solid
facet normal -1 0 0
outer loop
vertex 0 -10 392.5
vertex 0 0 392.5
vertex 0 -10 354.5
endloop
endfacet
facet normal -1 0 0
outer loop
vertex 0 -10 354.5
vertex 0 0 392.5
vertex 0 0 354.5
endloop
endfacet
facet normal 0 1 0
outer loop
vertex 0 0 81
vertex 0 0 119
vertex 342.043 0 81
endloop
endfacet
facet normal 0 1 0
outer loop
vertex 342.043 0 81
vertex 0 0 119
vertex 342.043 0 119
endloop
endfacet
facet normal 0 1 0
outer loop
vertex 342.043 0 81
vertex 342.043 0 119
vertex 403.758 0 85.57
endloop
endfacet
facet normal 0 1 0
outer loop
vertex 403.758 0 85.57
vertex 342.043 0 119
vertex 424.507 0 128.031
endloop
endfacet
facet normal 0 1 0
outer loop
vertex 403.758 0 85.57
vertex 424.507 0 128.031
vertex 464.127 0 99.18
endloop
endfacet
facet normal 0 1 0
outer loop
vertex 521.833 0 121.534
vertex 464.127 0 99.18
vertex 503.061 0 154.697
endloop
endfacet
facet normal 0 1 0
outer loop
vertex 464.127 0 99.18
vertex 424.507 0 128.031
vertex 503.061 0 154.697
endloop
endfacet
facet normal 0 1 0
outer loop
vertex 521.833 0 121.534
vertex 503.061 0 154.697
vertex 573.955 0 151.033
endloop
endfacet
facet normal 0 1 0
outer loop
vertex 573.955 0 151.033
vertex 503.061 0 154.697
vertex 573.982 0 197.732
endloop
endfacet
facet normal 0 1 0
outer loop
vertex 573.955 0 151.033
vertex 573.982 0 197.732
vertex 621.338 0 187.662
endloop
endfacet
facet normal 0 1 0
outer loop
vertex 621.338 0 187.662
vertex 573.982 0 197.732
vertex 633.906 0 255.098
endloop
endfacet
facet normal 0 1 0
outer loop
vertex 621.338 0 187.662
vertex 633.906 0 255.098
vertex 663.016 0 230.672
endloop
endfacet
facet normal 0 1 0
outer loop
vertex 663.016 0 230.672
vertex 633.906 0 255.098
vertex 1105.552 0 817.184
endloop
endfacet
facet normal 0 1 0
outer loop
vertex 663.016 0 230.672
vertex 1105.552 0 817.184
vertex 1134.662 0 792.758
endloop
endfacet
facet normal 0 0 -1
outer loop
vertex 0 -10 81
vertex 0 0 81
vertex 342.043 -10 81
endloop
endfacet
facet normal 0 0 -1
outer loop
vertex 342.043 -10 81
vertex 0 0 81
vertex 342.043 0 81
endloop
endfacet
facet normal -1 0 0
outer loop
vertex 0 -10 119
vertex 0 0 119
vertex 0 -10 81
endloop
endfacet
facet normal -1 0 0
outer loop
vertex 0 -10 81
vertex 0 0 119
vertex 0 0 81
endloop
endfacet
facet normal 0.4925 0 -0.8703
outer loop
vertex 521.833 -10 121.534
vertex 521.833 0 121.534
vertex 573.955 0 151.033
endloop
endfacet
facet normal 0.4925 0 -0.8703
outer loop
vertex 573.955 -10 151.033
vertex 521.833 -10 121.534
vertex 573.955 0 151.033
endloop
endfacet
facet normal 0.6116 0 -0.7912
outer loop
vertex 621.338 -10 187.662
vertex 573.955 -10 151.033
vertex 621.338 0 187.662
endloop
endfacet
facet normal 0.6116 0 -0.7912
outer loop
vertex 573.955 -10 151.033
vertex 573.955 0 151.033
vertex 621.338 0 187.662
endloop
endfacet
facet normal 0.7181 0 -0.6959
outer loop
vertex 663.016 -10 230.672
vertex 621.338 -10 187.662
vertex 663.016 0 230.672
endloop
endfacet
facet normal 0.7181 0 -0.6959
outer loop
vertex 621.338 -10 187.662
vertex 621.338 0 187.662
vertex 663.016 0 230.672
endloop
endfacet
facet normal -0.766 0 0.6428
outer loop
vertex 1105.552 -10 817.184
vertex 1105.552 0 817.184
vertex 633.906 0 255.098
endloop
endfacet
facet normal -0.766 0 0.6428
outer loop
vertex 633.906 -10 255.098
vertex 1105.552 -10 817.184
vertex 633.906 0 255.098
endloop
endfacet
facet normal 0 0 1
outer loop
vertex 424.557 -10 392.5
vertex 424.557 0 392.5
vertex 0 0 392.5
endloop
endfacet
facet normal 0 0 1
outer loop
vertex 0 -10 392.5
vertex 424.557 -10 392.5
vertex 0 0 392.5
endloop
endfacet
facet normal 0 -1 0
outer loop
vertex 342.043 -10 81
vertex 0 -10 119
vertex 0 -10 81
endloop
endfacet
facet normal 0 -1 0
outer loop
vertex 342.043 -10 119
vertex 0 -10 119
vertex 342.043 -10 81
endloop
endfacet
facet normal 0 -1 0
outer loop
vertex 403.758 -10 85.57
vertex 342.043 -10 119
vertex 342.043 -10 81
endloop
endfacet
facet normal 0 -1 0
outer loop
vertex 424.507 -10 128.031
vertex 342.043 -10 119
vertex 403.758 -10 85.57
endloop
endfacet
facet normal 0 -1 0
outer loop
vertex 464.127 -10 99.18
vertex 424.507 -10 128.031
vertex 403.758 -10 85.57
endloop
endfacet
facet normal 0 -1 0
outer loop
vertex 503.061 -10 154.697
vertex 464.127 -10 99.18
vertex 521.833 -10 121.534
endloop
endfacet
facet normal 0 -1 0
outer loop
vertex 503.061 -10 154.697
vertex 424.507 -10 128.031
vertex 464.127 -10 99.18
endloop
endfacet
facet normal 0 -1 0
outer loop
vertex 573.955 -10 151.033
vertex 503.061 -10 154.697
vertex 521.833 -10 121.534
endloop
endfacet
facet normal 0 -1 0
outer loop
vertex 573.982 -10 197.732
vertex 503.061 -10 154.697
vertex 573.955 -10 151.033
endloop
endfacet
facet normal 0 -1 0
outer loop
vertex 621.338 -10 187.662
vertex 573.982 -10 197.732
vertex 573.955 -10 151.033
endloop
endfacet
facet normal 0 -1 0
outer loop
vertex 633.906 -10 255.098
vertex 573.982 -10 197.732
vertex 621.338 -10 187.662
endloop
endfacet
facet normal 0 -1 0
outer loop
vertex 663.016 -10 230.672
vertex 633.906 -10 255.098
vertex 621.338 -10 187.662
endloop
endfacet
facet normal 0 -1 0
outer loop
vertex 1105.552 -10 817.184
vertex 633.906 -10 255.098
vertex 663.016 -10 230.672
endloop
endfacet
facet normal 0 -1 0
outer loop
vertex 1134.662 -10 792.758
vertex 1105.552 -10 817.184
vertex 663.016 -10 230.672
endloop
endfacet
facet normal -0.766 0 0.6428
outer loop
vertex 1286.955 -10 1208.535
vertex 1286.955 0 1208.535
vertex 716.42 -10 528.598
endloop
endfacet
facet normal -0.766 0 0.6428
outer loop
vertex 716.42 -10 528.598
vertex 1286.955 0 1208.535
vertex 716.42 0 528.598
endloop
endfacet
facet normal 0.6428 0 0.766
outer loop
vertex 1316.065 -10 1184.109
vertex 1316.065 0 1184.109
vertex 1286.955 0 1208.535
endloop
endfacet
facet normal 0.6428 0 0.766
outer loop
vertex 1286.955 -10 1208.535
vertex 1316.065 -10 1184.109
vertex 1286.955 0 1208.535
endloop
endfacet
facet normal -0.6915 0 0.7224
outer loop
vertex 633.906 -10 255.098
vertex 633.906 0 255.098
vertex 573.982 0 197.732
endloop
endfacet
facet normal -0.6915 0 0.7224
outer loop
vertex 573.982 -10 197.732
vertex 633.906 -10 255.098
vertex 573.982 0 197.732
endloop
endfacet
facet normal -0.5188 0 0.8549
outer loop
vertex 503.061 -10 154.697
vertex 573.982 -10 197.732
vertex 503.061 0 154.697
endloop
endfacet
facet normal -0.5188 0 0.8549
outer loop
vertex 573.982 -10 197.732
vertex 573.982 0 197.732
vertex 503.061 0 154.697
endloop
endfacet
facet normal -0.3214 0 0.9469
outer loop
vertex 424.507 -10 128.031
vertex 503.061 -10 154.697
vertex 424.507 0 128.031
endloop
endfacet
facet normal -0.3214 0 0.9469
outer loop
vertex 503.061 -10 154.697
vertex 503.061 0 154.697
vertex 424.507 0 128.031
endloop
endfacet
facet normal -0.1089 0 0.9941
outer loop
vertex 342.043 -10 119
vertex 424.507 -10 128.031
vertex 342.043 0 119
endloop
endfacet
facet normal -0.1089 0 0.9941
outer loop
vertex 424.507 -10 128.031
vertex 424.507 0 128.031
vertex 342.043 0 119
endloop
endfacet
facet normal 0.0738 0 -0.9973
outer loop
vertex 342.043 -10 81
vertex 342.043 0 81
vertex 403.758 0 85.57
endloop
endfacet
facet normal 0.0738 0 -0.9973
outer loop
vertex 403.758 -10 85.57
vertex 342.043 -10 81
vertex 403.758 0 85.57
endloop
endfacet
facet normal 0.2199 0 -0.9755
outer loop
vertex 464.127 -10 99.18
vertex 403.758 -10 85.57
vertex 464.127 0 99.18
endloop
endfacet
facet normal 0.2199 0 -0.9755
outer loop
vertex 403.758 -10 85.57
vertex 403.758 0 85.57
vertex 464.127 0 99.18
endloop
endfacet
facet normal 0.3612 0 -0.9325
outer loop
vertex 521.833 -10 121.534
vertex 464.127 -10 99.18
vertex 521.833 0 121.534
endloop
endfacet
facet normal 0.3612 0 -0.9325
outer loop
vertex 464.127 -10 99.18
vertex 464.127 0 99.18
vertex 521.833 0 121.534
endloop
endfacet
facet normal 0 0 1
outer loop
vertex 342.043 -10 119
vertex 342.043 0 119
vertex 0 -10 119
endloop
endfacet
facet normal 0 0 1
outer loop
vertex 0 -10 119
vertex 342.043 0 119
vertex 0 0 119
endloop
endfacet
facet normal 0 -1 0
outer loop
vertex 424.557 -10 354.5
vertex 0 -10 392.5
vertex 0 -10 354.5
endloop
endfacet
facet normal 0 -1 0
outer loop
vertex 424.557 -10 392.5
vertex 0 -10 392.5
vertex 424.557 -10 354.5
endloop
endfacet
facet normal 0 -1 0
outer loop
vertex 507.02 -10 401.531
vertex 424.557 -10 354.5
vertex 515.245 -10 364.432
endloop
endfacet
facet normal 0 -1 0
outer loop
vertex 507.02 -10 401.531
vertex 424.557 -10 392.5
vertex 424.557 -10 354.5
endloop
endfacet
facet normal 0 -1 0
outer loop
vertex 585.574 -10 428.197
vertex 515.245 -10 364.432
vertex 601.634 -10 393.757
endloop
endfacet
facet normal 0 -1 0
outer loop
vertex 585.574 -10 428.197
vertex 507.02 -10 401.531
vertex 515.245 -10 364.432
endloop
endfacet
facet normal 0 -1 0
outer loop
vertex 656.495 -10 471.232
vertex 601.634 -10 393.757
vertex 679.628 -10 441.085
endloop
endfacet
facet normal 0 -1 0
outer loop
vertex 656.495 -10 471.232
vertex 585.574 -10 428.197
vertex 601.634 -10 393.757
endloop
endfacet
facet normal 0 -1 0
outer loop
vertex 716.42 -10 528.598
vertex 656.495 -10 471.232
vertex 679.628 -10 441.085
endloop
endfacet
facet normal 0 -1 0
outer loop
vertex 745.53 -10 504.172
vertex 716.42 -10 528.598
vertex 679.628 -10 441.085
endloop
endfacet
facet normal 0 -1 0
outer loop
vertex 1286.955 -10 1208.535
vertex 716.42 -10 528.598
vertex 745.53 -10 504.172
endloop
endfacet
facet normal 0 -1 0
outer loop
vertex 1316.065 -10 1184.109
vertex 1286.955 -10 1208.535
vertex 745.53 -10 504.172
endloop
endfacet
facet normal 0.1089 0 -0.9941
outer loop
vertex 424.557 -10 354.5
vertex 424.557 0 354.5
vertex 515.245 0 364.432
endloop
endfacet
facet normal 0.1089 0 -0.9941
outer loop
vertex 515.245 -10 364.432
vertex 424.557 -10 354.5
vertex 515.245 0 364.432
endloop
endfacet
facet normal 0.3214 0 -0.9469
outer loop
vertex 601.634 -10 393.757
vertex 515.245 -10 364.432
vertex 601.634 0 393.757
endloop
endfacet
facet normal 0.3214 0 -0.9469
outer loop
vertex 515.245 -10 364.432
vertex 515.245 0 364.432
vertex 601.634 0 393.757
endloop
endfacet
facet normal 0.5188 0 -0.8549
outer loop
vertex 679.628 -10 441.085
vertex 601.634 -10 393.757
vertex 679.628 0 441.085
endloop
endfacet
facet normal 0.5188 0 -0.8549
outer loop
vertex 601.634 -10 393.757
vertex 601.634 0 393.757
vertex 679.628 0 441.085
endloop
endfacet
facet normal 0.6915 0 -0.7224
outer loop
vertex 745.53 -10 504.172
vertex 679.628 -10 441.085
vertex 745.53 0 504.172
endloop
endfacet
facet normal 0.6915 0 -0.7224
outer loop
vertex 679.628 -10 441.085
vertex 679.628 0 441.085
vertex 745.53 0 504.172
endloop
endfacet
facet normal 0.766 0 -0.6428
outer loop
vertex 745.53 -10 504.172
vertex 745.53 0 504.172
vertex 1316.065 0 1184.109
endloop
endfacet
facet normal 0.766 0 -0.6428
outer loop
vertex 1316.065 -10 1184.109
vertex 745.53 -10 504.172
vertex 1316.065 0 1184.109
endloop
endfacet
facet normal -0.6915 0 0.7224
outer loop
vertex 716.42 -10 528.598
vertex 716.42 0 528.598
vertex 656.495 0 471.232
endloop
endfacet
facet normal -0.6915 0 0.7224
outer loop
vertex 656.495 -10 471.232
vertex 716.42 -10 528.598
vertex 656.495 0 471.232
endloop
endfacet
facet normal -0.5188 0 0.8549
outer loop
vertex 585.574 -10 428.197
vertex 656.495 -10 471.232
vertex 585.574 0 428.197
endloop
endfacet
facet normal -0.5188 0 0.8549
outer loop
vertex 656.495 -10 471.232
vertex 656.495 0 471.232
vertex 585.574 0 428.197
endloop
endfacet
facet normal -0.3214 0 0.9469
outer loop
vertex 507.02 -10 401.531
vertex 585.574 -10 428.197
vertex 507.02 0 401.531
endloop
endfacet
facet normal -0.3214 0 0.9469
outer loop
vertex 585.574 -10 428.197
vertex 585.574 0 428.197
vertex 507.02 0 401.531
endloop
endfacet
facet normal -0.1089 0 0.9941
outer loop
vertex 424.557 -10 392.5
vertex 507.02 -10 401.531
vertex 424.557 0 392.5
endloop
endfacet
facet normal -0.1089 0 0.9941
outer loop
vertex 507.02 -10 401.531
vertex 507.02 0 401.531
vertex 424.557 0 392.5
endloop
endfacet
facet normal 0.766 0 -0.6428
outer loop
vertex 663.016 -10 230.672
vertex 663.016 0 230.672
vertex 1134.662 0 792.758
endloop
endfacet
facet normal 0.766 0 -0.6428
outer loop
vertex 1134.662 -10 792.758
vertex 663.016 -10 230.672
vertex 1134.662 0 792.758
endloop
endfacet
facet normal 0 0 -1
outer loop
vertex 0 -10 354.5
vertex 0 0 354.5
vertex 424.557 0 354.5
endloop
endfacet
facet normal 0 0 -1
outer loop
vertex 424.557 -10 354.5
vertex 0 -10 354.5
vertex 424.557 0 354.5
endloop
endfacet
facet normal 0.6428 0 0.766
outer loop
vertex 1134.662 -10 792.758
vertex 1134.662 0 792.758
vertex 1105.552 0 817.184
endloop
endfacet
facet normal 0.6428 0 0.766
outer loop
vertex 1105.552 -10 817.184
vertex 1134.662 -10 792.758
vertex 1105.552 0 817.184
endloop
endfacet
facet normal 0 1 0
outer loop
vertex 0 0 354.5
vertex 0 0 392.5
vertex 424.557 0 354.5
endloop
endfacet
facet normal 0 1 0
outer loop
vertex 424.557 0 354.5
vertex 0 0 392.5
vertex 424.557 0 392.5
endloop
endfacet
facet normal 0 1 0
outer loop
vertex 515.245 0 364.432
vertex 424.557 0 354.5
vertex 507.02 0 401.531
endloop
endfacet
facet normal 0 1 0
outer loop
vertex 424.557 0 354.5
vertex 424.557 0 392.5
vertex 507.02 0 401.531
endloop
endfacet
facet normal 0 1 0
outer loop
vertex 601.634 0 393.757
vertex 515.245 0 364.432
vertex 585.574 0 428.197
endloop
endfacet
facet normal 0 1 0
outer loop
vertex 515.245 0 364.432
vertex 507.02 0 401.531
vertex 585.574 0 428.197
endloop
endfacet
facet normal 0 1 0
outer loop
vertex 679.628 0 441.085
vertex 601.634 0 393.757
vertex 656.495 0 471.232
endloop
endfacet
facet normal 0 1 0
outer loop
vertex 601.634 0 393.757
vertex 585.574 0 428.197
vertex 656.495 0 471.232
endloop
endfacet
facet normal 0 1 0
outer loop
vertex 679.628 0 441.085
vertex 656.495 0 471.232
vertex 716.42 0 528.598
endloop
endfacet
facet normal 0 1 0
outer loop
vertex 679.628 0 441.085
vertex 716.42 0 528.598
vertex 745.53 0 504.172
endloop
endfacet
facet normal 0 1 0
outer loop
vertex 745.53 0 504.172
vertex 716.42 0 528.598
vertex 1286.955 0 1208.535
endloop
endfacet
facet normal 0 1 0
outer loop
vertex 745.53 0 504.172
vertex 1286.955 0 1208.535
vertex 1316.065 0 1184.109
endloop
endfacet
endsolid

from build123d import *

# Parameters (mm, degrees)
F1_DEPTH = 10


with BuildPart() as f1:
    # F0 (on Front) → F1 (new body)
    with BuildSketch(Plane.XZ):
        with BuildLine():
            ThreePointArc((424.556895, 354.5), (601.633947, 393.757037), (745.529517, 504.171992))
            Line((745.529517, 504.171992), (1316.064805, 1184.109471))
            Line((1316.064805, 1184.109471), (1286.955116, 1208.5354))
            Line((1286.955116, 1208.5354), (716.419828, 528.597921))
            ThreePointArc((716.419828, 528.597921), (585.574453, 428.196733), (424.556895, 392.5))
            Line((424.556895, 392.5), (0, 392.5))
            Line((0, 392.5), (0, 373.5))
            Line((0, 373.5), (0, 354.5))
            Line((0, 354.5), (424.556895, 354.5))
        make_face()
        with BuildLine():
            Line((521.832516, 121.533508), (555.604914, 161.781884))
            ThreePointArc((555.604914, 161.781884), (453.202673, 115.755777), (342.043432, 100))
            Line((342.043432, 100), (292.043432, 100))
            Line((292.043432, 100), (0, 100))
            Line((0, 100), (0, 81))
            Line((0, 81), (342.043432, 81))
            ThreePointArc((342.043432, 81), (434.194233, 91.258969), (521.832516, 121.533508))
        make_face()
        with BuildLine():
            Line((555.604914, 161.781884), (633.906365, 255.097921))
            ThreePointArc((633.906365, 255.097921), (503.06099, 154.696733), (342.043432, 119))
            Line((342.043432, 119), (0, 119))
            Line((0, 119), (0, 100))
            Line((0, 100), (292.043432, 100))
            Line((292.043432, 100), (342.043432, 100))
            ThreePointArc((342.043432, 100), (453.202673, 115.755777), (555.604914, 161.781884))
        make_face()
        with BuildLine():
            Line((1105.552412, 817.183791), (633.906365, 255.097921))
            Line((633.906365, 255.097921), (555.604914, 161.781884))
            Line((555.604914, 161.781884), (521.832516, 121.533508))
            ThreePointArc((521.832516, 121.533508), (598.301844, 168.499432), (663.016054, 230.671992))
            Line((663.016054, 230.671992), (1134.662101, 792.757862))
            Line((1134.662101, 792.757862), (1105.552412, 817.183791))
        make_face()
    extrude(amount=F1_DEPTH)


solid = f1.part
